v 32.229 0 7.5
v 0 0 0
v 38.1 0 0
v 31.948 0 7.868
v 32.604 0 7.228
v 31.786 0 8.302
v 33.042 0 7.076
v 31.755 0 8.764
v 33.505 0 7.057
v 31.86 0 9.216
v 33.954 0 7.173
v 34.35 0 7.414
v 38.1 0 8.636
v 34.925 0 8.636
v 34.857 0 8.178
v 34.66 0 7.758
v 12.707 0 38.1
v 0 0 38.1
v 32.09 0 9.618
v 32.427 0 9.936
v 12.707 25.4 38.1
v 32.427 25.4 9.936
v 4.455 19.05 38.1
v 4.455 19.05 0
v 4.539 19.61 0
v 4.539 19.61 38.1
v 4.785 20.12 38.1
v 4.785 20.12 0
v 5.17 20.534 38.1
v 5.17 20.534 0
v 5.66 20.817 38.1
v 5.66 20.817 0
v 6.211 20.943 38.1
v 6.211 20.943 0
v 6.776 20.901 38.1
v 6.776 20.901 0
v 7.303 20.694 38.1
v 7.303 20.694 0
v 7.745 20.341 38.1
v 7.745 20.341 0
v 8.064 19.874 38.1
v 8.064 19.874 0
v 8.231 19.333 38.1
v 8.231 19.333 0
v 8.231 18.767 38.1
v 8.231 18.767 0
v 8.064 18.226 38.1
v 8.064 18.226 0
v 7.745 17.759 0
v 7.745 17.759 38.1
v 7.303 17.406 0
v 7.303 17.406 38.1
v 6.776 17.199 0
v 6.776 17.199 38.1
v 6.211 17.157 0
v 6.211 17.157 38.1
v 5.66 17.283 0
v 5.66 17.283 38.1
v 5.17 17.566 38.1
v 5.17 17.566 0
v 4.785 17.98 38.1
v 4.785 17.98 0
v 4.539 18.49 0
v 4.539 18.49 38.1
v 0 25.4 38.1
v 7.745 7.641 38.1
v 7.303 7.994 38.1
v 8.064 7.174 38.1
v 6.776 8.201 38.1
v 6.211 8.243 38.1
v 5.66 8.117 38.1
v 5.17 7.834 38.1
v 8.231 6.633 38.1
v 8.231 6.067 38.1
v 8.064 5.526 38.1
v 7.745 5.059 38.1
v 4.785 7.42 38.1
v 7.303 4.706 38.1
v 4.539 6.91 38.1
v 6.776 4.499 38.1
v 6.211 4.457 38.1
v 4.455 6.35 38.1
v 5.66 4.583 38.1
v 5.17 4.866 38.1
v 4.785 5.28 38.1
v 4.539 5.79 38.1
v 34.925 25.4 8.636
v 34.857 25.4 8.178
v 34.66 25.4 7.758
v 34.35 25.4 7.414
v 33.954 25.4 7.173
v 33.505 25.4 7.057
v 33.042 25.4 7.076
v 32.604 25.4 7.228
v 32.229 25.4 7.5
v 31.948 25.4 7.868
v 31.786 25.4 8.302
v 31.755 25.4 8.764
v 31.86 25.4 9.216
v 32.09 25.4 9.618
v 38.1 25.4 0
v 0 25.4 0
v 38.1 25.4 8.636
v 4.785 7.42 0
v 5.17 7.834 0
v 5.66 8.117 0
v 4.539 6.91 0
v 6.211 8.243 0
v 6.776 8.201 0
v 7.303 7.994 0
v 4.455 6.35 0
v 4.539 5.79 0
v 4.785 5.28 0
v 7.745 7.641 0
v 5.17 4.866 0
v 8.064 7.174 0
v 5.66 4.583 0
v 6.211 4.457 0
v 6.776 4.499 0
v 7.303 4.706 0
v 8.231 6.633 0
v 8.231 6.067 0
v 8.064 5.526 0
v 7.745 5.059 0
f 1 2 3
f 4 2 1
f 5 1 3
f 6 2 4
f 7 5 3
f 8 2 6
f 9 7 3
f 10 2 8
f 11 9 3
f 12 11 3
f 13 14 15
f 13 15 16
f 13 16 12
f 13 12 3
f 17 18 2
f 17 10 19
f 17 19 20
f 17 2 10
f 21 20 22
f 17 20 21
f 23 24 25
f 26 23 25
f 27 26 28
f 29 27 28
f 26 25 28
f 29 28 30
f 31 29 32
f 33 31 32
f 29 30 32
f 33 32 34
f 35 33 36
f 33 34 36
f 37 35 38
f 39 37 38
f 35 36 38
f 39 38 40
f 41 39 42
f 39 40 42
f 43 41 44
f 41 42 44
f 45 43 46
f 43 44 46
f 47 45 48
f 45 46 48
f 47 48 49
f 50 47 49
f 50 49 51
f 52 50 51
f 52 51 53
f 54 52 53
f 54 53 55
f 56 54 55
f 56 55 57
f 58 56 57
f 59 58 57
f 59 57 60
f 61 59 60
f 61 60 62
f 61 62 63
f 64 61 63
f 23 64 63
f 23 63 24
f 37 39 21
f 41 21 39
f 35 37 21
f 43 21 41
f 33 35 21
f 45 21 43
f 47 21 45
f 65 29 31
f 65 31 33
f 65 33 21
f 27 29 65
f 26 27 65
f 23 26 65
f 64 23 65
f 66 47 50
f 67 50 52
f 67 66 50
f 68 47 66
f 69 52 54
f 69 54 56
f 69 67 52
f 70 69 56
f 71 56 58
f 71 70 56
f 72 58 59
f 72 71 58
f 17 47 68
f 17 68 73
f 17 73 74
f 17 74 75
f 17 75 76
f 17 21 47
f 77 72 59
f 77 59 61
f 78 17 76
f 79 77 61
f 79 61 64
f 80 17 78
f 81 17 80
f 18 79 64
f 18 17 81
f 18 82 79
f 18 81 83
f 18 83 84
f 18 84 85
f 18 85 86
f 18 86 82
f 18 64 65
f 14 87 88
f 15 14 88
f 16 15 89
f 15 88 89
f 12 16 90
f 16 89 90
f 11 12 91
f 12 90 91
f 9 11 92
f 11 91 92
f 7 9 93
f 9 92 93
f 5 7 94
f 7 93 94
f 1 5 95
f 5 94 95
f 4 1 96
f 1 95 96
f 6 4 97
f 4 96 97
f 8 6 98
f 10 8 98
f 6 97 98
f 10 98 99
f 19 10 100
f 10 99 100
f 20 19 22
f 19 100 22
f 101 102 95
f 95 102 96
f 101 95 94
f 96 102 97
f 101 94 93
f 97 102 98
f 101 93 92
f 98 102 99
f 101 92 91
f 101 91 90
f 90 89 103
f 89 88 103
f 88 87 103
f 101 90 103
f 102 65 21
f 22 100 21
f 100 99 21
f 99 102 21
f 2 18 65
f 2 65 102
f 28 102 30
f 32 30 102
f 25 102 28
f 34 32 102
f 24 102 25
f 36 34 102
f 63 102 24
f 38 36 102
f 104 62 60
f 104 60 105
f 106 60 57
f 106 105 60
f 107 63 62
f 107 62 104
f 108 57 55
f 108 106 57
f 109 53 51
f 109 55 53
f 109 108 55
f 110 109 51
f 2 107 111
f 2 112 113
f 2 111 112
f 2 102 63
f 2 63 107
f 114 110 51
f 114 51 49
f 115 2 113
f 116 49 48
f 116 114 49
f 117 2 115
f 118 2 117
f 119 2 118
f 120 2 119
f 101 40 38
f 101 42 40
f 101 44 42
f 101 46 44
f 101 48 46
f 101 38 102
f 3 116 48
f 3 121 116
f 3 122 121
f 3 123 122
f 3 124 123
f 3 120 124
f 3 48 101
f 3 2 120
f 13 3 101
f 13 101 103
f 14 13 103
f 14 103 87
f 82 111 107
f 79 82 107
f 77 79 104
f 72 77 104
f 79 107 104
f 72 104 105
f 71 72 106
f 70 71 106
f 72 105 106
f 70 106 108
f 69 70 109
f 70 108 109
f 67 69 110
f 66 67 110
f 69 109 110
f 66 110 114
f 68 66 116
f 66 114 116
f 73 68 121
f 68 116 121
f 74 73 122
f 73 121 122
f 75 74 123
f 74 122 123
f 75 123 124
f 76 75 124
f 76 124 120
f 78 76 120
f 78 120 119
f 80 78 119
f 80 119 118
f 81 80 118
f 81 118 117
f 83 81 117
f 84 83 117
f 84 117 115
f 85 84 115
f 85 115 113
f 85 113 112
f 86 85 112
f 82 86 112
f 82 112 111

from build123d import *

# Parameters (mm, degrees)
F1_DEPTH = 25.4
F3_D     = 3.7973
F5_D     = 3.175


with BuildPart() as f1:
    # F0 (on Front) → F1 (new body)
    with BuildSketch(Plane.XZ):
        Polygon((0, 38.1), (0, 0), (38.1, 0), (38.1, 8.636), (33.3375, 8.636), (12.7065850942, 38.1), align=None)
    extrude(amount=-F1_DEPTH)

    # F3 (through all)
    with Locations(Plane.XY.offset(38.1)):
        with Locations((6.3532925471, 19.05), (6.3532925471, 6.35)):
            Hole(F3_D / 2)

    # F5 (through all)
    with Locations(Plane.XZ):
        with Locations((33.3375, 8.636)):
            Hole(F5_D / 2)


solid = f1.part
